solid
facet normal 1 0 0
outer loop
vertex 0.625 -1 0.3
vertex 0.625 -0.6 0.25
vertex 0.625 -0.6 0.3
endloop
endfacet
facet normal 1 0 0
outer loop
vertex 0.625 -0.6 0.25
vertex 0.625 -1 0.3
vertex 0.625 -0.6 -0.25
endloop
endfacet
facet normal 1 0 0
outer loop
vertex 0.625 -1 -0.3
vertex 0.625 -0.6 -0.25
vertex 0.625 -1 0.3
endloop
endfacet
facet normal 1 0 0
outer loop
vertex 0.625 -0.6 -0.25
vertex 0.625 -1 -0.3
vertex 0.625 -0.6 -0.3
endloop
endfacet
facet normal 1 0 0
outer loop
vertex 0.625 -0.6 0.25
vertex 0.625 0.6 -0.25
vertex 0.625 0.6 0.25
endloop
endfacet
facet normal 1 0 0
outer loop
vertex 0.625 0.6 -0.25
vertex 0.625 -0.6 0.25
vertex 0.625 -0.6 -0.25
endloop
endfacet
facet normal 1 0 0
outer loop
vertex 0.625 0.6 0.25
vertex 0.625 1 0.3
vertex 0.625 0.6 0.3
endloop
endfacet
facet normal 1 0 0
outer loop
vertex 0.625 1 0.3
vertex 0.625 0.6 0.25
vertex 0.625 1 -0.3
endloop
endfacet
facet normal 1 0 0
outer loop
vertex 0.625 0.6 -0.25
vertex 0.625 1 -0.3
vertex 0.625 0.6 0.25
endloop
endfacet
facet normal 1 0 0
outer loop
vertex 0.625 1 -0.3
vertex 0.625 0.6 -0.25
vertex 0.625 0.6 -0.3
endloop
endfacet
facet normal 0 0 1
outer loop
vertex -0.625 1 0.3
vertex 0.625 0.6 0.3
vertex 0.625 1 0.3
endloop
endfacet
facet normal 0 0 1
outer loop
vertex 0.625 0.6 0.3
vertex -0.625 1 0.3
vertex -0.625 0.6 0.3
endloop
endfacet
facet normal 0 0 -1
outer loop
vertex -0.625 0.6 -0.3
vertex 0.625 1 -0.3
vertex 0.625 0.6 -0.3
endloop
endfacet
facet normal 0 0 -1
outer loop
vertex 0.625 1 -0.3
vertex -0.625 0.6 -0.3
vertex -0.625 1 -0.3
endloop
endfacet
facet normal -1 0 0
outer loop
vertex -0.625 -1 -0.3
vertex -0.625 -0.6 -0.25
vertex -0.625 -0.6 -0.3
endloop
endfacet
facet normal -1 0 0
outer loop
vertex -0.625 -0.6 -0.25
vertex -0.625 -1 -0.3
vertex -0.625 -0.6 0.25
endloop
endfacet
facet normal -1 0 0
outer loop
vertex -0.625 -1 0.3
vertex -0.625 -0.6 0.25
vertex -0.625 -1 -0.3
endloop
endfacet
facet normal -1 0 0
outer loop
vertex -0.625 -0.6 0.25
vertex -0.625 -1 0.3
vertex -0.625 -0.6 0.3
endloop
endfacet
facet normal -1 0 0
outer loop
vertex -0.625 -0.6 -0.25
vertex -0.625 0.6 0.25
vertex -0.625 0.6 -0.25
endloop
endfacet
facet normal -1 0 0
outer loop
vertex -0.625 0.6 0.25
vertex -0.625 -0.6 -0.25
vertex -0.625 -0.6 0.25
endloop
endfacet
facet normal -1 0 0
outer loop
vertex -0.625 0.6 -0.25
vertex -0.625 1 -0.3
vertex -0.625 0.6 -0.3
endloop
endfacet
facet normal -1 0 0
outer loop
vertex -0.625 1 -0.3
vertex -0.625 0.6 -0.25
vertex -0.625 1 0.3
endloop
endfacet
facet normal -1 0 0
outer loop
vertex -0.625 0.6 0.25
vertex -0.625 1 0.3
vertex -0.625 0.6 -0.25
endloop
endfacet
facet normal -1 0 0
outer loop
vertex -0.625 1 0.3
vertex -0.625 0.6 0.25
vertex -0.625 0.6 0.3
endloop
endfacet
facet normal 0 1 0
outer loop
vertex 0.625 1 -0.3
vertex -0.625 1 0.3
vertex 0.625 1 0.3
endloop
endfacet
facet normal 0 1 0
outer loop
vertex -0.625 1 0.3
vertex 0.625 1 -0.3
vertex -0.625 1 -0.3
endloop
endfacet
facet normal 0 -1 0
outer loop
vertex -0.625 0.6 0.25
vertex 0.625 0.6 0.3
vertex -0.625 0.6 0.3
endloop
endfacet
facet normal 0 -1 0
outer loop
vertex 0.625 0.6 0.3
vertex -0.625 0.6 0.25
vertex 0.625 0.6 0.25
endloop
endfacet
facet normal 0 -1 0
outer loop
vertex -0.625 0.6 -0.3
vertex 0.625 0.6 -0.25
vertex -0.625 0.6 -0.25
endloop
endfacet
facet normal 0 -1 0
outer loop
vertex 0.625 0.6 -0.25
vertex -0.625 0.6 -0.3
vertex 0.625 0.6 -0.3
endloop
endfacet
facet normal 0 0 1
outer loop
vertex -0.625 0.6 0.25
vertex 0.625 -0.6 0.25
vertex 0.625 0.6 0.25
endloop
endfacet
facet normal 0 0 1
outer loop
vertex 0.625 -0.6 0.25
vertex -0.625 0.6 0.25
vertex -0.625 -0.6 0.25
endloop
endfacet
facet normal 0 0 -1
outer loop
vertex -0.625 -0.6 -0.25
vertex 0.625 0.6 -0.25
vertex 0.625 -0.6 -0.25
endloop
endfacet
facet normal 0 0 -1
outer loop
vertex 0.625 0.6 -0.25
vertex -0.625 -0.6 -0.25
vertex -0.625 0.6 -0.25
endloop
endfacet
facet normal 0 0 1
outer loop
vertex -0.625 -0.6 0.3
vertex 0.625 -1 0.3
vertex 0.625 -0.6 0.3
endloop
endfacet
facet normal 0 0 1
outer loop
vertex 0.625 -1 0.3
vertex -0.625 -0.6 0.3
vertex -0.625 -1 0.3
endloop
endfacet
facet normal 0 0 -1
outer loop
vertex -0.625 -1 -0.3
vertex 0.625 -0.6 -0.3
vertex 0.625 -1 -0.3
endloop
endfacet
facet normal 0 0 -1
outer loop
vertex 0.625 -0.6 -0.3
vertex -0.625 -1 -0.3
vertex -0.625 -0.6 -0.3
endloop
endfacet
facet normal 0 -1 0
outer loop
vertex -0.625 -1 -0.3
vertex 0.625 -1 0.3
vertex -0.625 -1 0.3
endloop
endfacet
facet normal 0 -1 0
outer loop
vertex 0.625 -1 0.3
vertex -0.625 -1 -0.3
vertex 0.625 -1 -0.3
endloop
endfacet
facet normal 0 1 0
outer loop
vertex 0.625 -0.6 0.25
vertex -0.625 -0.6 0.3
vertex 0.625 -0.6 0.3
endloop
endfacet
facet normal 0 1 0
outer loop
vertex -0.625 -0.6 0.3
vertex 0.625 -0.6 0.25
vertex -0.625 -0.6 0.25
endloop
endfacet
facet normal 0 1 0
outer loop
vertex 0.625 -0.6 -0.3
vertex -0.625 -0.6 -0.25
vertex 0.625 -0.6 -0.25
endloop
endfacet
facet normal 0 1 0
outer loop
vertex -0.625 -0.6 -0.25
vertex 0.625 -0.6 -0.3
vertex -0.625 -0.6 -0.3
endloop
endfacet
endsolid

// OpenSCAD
W=1.25;
L=2.0;
a=0.4;
b=0.4;
t=0.6;
module pin(){
    difference(){
    cube([W,b,t],center = true);
    #translate([-W/2,-b/2,-t/2+0.05]) cube([W,b-0.05,t-0.1]);    
    }
}
module smd0805(){
    cube([W,L-0.1,t-0.1],center=true);
    mirror([0,1,0])
    color("grey")translate([0,L/2-b/2,0]) pin();
    color("grey")translate([0,L/2-b/2,0]) pin();
    }
    
    smd0805();
